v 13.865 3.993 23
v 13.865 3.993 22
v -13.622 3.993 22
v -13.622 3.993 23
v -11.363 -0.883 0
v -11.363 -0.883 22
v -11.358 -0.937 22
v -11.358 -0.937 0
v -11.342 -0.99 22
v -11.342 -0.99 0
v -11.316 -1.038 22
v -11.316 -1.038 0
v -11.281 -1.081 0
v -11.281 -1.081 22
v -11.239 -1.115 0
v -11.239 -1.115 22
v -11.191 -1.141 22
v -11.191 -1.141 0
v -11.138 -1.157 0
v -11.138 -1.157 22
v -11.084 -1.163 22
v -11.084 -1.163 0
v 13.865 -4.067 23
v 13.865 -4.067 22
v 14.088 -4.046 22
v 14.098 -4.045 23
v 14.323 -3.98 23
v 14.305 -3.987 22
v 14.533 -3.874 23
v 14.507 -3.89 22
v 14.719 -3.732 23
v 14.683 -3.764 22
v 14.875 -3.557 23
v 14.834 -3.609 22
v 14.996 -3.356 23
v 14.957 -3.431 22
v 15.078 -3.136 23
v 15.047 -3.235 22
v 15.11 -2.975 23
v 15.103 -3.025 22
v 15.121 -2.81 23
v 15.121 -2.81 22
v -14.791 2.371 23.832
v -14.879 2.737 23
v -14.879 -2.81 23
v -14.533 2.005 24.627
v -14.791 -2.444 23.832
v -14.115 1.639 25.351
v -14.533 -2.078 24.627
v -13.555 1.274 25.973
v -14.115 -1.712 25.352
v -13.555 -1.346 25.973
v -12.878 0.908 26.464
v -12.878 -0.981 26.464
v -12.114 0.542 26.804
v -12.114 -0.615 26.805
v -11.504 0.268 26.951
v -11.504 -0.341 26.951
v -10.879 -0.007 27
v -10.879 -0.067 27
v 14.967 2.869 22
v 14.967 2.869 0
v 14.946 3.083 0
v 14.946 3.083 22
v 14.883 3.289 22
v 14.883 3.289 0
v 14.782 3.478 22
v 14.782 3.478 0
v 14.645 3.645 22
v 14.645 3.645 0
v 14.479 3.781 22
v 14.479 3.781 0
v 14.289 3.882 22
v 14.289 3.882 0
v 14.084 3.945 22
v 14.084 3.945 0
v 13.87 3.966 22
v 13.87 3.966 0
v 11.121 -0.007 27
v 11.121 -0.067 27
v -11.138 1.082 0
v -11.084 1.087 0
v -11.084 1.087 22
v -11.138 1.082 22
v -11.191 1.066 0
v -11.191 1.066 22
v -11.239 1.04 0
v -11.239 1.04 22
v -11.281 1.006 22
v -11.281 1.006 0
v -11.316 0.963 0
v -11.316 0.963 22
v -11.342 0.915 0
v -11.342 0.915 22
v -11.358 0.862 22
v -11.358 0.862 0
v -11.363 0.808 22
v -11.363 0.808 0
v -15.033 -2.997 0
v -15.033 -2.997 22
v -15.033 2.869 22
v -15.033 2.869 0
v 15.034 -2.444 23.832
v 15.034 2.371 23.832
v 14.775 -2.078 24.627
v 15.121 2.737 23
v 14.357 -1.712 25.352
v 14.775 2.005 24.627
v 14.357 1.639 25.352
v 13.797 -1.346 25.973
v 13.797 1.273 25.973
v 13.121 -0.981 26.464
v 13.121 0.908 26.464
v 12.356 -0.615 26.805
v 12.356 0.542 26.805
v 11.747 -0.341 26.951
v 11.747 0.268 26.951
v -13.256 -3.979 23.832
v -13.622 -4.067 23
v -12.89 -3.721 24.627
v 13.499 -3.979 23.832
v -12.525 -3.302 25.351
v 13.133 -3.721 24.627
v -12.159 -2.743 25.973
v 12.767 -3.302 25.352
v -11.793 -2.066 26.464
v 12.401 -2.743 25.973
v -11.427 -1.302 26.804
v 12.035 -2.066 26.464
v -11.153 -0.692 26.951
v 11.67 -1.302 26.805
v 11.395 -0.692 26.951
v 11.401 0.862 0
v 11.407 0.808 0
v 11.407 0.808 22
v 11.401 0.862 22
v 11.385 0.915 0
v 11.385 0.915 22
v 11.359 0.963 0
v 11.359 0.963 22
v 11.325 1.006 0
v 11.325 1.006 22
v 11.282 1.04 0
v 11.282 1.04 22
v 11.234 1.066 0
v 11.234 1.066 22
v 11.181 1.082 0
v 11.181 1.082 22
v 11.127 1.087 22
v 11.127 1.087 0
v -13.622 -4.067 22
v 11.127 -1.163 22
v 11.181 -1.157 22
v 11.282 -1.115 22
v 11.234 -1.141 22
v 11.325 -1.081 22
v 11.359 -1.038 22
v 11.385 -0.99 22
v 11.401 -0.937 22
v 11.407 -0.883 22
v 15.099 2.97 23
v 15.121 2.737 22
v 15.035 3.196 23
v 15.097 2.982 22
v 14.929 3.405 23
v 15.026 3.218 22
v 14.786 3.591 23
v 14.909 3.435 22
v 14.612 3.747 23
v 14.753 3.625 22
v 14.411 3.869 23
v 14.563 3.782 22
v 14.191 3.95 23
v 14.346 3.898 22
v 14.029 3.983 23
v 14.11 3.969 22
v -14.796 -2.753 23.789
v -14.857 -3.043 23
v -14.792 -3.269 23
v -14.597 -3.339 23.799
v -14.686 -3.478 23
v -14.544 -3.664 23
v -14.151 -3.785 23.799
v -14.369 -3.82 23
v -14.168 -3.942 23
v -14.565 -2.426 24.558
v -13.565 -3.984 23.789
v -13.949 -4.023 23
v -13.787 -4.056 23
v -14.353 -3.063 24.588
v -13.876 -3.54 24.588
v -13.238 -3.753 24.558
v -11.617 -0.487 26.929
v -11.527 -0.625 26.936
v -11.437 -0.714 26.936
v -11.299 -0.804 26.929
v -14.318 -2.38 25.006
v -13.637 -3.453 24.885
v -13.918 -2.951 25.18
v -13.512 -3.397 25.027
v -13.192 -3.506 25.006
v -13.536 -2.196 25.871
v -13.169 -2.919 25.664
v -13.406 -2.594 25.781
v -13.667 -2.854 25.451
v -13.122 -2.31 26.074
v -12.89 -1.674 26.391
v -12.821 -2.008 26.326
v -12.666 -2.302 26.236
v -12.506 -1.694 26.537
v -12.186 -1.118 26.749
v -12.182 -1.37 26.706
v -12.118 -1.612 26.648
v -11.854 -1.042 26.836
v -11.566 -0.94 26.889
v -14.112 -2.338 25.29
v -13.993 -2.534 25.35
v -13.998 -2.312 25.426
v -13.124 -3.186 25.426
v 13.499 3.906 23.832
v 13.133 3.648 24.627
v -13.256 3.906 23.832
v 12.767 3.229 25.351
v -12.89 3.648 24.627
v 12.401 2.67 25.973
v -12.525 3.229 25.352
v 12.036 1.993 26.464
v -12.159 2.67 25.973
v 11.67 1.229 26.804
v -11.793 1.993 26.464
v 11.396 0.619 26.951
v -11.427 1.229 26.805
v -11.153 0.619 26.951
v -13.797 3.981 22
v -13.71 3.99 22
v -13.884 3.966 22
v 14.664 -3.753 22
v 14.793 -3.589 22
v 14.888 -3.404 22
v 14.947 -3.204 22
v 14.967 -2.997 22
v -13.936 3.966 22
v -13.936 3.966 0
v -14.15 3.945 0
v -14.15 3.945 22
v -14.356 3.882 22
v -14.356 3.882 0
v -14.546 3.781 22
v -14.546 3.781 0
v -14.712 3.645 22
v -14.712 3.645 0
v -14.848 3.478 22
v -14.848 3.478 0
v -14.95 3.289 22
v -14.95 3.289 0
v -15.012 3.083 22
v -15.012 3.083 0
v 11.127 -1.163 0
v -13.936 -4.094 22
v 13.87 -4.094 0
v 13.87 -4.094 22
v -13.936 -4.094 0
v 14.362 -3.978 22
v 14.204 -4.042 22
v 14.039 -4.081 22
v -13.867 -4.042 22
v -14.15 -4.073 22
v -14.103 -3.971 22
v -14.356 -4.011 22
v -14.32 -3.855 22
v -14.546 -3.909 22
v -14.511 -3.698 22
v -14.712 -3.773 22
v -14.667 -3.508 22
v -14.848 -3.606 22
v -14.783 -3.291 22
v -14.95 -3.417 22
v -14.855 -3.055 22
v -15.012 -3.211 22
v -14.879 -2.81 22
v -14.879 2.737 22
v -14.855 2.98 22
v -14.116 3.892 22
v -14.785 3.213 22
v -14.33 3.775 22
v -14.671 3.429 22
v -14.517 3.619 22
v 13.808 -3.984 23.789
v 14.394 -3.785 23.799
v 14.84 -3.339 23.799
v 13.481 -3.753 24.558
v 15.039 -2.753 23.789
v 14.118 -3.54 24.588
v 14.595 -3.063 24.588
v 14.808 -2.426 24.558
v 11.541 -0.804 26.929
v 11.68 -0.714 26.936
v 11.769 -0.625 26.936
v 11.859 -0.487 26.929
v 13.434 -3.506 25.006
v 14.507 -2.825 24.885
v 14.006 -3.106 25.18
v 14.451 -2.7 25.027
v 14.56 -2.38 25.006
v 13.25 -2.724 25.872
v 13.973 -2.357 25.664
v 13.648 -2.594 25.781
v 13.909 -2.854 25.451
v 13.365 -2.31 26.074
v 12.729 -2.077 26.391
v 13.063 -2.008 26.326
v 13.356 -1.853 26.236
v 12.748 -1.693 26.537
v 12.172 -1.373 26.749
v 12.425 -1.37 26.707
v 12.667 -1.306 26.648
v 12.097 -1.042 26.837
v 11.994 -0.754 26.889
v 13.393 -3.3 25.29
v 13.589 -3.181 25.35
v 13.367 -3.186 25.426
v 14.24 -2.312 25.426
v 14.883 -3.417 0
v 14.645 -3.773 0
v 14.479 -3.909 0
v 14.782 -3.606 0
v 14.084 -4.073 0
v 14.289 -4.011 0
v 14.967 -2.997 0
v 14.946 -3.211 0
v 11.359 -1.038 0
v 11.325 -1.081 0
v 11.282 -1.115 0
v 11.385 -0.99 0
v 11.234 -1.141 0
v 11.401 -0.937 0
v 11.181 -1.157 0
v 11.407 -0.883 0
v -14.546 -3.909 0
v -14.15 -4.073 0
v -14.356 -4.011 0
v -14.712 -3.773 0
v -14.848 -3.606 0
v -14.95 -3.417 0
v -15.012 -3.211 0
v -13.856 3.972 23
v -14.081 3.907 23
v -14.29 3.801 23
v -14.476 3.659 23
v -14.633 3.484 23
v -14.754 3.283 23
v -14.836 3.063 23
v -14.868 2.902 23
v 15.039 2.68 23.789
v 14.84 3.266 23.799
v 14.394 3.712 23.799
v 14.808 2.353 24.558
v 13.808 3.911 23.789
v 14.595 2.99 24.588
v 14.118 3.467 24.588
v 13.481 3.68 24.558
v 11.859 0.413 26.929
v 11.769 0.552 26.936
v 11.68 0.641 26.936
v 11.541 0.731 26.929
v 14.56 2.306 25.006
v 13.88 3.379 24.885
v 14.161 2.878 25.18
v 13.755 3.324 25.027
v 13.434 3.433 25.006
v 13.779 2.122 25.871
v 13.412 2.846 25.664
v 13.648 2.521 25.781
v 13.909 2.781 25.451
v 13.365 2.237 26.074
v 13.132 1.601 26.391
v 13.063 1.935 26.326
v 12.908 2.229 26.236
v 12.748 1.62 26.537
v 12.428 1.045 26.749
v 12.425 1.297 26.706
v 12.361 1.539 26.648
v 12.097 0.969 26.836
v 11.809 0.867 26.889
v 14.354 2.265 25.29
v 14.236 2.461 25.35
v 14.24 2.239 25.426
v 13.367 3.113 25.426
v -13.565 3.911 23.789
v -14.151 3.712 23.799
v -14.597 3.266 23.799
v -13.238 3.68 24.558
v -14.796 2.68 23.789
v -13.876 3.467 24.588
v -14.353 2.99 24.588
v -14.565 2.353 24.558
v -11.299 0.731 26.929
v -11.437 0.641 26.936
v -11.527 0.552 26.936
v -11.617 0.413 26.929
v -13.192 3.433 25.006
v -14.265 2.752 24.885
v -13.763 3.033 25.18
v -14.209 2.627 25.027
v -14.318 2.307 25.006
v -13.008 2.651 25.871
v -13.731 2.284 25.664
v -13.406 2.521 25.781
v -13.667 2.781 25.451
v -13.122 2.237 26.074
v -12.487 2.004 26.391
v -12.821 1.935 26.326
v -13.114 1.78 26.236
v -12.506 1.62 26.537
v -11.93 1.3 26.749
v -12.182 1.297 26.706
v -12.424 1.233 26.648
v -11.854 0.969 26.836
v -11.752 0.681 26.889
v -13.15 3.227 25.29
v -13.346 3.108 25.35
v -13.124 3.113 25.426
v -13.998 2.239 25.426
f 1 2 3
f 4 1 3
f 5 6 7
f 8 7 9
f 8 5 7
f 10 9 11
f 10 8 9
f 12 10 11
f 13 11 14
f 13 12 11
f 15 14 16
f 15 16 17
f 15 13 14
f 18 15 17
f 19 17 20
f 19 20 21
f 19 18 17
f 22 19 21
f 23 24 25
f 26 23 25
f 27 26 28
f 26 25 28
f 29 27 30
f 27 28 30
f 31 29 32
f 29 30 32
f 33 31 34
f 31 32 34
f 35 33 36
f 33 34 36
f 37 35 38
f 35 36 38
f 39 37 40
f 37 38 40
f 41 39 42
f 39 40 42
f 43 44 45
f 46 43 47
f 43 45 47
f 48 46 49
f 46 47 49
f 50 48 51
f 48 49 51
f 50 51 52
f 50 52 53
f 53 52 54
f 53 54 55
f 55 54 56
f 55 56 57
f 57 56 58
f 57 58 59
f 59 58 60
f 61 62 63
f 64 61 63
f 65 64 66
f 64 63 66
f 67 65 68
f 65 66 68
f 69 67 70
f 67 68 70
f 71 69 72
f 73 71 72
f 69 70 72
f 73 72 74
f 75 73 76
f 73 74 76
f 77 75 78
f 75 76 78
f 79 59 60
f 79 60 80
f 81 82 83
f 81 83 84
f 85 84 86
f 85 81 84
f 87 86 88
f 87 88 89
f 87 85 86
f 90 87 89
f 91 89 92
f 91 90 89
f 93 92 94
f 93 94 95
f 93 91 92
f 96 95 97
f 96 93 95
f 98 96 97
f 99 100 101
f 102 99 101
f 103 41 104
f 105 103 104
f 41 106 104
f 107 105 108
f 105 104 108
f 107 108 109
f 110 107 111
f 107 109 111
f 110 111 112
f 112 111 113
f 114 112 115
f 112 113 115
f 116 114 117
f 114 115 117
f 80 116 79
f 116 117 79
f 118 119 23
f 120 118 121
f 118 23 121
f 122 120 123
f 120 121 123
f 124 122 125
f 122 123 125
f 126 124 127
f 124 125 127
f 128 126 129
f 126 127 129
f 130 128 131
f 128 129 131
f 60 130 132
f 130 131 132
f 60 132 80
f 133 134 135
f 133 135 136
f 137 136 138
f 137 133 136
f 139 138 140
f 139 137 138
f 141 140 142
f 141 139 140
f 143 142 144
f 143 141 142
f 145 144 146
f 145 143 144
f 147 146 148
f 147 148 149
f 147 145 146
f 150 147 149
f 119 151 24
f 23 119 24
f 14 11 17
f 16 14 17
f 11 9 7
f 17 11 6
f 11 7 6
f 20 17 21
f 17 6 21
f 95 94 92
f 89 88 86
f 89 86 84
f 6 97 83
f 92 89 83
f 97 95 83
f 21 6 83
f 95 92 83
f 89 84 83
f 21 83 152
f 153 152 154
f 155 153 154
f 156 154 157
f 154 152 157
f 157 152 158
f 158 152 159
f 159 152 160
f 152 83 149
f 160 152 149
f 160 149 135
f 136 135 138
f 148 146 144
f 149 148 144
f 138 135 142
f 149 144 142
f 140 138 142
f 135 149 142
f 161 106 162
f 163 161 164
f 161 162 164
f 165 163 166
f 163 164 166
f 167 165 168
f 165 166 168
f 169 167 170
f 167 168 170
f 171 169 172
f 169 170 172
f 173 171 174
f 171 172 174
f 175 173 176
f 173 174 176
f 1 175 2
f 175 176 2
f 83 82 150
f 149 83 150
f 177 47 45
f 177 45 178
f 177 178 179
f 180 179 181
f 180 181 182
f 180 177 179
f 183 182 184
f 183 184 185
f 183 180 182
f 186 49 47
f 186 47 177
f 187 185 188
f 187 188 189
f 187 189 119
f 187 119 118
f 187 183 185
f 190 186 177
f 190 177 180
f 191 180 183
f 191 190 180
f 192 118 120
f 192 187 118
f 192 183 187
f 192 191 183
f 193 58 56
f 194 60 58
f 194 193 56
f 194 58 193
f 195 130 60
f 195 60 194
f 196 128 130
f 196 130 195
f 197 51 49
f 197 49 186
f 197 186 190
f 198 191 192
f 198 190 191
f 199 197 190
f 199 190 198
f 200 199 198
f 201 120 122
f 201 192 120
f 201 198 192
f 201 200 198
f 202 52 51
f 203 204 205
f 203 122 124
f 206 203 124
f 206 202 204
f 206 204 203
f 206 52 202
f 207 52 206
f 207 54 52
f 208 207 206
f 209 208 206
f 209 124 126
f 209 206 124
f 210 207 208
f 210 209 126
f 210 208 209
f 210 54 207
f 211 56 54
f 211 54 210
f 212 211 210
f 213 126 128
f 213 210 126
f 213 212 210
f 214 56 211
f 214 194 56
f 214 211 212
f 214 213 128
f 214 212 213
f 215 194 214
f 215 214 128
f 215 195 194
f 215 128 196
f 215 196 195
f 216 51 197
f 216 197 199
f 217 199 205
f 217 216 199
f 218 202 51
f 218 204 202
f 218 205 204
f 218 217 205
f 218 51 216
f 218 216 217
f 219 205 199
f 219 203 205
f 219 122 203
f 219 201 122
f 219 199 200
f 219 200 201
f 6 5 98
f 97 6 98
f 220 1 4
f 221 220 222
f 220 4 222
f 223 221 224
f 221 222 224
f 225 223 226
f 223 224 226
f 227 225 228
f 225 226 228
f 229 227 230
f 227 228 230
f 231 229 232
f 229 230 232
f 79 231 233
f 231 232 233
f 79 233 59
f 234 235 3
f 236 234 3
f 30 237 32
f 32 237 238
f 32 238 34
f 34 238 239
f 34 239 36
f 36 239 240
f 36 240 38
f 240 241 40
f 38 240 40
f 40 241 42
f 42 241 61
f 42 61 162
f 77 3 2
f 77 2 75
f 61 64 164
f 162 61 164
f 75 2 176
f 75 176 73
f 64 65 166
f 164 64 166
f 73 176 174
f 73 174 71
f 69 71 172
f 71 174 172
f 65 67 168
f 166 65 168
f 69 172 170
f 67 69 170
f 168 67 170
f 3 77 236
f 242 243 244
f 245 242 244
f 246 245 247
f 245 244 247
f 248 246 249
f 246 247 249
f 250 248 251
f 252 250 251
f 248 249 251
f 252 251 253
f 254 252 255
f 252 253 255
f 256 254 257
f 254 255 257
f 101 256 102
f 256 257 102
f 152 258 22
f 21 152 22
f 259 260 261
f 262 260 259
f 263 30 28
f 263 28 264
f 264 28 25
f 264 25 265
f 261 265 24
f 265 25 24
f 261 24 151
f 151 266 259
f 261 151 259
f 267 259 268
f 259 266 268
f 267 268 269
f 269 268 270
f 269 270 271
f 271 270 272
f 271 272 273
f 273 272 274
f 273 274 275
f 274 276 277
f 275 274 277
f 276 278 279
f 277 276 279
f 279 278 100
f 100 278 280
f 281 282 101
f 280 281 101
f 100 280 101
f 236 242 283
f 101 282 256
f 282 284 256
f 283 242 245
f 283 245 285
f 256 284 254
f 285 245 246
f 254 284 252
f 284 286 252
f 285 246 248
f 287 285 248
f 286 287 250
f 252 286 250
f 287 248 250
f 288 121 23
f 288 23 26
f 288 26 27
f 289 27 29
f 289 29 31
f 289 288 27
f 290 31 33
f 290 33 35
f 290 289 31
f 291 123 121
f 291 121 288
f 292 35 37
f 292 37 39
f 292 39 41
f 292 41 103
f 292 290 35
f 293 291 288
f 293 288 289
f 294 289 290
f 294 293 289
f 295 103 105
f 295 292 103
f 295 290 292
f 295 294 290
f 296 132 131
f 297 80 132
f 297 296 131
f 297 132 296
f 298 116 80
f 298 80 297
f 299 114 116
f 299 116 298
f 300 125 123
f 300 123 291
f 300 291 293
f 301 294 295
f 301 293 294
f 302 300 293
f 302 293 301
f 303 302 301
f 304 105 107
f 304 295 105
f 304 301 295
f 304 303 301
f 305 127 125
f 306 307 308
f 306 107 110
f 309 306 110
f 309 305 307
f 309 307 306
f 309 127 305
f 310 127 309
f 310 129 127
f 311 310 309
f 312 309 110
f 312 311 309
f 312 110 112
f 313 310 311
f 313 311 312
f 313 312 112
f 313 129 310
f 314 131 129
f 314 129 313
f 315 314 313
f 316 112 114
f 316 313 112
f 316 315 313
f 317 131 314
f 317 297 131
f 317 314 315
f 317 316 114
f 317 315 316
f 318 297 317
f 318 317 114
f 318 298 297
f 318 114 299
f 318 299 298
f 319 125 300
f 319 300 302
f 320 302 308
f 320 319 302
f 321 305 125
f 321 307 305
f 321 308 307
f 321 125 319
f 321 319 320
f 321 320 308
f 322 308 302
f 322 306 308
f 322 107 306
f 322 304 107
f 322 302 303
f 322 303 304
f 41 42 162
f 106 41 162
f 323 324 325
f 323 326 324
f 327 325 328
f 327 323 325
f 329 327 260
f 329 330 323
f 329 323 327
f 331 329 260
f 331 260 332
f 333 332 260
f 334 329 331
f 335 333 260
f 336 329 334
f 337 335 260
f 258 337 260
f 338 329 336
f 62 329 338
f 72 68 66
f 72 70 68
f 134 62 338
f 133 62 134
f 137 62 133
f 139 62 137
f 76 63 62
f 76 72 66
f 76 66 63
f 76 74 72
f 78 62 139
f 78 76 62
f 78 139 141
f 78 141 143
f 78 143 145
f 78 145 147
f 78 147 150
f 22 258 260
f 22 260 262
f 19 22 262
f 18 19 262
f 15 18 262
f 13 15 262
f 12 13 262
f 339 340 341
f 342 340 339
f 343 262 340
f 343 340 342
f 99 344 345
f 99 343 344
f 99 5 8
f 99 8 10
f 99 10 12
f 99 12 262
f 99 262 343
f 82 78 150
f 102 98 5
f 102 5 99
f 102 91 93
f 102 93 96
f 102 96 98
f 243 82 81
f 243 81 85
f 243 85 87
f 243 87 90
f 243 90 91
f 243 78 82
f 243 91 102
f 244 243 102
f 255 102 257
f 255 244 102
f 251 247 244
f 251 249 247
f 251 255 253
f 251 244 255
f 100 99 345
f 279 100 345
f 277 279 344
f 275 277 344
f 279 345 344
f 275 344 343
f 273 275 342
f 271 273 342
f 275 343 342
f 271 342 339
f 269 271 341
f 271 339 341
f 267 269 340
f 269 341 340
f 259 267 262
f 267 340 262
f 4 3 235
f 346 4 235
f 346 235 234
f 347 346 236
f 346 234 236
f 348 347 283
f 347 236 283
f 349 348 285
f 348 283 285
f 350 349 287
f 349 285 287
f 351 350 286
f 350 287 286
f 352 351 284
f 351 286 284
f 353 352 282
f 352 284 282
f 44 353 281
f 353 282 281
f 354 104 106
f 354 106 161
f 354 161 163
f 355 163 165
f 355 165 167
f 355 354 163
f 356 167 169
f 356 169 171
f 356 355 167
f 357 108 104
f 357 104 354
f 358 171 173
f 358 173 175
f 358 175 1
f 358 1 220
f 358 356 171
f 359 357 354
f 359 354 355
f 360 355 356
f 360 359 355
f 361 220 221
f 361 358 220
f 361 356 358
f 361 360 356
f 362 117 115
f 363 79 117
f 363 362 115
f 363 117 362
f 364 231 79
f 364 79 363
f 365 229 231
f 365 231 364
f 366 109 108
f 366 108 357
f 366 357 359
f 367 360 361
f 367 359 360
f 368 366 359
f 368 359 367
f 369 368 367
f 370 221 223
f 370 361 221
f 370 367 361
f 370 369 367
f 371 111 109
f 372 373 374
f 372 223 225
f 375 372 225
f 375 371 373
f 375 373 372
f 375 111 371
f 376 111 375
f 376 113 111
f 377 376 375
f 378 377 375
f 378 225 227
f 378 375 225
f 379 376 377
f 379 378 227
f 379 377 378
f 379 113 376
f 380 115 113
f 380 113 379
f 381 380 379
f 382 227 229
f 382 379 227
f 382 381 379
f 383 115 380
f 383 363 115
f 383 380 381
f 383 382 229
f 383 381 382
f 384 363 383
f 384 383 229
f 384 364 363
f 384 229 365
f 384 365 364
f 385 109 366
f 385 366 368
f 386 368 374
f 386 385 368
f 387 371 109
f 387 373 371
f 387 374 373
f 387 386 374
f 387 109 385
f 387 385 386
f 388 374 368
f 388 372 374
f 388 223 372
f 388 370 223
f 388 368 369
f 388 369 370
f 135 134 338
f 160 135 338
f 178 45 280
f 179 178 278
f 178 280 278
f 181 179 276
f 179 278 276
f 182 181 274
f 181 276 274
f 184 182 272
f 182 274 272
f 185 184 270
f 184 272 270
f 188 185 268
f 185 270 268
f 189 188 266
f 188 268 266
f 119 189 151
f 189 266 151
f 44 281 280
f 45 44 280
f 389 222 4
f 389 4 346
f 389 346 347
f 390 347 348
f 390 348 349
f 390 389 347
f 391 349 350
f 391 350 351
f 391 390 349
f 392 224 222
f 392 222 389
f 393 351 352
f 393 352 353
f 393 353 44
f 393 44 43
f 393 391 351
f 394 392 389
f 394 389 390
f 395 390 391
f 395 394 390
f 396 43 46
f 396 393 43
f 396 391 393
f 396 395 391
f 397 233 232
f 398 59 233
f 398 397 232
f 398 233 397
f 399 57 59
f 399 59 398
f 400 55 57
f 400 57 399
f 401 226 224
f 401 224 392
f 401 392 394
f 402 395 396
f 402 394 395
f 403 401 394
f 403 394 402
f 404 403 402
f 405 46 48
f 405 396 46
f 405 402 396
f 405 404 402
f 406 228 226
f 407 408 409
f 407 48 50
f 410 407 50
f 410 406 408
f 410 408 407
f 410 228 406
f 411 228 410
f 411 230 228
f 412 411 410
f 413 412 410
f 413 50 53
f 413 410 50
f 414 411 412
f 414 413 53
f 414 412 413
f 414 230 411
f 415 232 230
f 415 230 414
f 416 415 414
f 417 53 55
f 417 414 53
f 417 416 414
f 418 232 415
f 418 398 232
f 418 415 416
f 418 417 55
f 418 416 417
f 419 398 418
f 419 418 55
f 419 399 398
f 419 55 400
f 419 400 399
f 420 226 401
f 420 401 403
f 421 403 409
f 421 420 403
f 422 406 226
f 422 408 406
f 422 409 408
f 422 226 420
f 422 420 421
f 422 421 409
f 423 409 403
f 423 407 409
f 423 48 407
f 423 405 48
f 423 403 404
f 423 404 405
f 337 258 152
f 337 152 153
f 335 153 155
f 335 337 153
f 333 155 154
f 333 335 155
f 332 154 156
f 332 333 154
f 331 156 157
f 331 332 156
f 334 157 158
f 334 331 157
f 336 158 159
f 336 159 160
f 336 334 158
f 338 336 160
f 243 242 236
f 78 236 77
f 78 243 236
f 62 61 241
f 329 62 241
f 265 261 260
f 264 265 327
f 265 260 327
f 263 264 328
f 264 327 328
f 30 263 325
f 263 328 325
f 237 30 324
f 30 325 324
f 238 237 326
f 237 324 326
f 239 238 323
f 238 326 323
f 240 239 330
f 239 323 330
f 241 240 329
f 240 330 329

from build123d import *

# Parameters (mm, degrees)
PAD_DEPTH    = 22
PAD001_DEPTH = 5
FILLET_R     = 4


with BuildPart() as part:
    # Sketch → Pad (new body)
    with BuildSketch(Plane.XY):
        with BuildLine():
            Line((-15.033203, -2.996852), (-15.033203, 2.868629))
            ThreePointArc((-13.935943, 3.965889), (-14.711823, 3.644509), (-15.033203, 2.868629))
            Line((-13.935943, 3.965889), (13.869538, 3.965889))
            ThreePointArc((14.966797, 2.868629), (14.645418, 3.644509), (13.869538, 3.965889))
            Line((14.966797, 2.868629), (14.966797, -2.996852))
            ThreePointArc((13.869538, -4.094111), (14.645418, -3.772731), (14.966797, -2.996852))
            Line((13.869538, -4.094111), (-13.935943, -4.094111))
            ThreePointArc((-15.033203, -2.996852), (-14.711823, -3.772731), (-13.935943, -4.094111))
        make_face()
        with BuildLine():
            Line((-11.363415, -0.882751), (-11.363415, 0.807684))
            ThreePointArc((-11.083632, 1.087466), (-11.281469, 1.00552), (-11.363415, 0.807684))
            Line((-11.083632, 1.087466), (11.126802, 1.087466))
            ThreePointArc((11.406585, 0.807684), (11.324638, 1.00552), (11.126802, 1.087466))
            Line((11.406585, 0.807684), (11.406585, -0.882751))
            ThreePointArc((11.126802, -1.162534), (11.324638, -1.080587), (11.406585, -0.882751))
            Line((11.126802, -1.162534), (-11.083632, -1.162534))
            ThreePointArc((-11.363415, -0.882751), (-11.281469, -1.080587), (-11.083632, -1.162534))
        make_face(mode=Mode.SUBTRACT)
    extrude(amount=PAD_DEPTH)

    # Sketch001 (on Face18 of Pad) → Pad001 (join)
    with BuildSketch(Plane.XY.offset(22)):
        with BuildLine():
            Line((15.12127, -2.809895), (15.12127, 2.736811))
            ThreePointArc((15.12127, 2.736811), (14.753207, 3.625395), (13.864623, 3.993458))
            Line((13.864623, 3.993458), (-13.622083, 3.993458))
            ThreePointArc((-13.622083, 3.993458), (-14.510667, 3.625395), (-14.87873, 2.736811))
            Line((-14.87873, 2.736811), (-14.87873, -2.809895))
            ThreePointArc((-14.87873, -2.809895), (-14.510667, -3.698479), (-13.622083, -4.066542))
            Line((-13.622083, -4.066542), (13.864623, -4.066542))
            ThreePointArc((13.864623, -4.066542), (14.753207, -3.698479), (15.12127, -2.809895))
        make_face()
    extrude(amount=PAD001_DEPTH)

    # Fillet
    fillet_edges = [part.edges().sort_by_distance(p)[0] for p in [
        (15.12127, -0.036542, 27),
        (14.753207, 3.625395, 27),
        (0.12127, 3.993458, 27),
        (-14.510667, 3.625395, 27),
        (-14.87873, -0.036542, 27),
        (-14.510667, -3.698479, 27),
        (0.12127, -4.066542, 27),
        (14.753207, -3.698479, 27),
    ]]
    fillet(fillet_edges, radius=FILLET_R)


solid = part.part
